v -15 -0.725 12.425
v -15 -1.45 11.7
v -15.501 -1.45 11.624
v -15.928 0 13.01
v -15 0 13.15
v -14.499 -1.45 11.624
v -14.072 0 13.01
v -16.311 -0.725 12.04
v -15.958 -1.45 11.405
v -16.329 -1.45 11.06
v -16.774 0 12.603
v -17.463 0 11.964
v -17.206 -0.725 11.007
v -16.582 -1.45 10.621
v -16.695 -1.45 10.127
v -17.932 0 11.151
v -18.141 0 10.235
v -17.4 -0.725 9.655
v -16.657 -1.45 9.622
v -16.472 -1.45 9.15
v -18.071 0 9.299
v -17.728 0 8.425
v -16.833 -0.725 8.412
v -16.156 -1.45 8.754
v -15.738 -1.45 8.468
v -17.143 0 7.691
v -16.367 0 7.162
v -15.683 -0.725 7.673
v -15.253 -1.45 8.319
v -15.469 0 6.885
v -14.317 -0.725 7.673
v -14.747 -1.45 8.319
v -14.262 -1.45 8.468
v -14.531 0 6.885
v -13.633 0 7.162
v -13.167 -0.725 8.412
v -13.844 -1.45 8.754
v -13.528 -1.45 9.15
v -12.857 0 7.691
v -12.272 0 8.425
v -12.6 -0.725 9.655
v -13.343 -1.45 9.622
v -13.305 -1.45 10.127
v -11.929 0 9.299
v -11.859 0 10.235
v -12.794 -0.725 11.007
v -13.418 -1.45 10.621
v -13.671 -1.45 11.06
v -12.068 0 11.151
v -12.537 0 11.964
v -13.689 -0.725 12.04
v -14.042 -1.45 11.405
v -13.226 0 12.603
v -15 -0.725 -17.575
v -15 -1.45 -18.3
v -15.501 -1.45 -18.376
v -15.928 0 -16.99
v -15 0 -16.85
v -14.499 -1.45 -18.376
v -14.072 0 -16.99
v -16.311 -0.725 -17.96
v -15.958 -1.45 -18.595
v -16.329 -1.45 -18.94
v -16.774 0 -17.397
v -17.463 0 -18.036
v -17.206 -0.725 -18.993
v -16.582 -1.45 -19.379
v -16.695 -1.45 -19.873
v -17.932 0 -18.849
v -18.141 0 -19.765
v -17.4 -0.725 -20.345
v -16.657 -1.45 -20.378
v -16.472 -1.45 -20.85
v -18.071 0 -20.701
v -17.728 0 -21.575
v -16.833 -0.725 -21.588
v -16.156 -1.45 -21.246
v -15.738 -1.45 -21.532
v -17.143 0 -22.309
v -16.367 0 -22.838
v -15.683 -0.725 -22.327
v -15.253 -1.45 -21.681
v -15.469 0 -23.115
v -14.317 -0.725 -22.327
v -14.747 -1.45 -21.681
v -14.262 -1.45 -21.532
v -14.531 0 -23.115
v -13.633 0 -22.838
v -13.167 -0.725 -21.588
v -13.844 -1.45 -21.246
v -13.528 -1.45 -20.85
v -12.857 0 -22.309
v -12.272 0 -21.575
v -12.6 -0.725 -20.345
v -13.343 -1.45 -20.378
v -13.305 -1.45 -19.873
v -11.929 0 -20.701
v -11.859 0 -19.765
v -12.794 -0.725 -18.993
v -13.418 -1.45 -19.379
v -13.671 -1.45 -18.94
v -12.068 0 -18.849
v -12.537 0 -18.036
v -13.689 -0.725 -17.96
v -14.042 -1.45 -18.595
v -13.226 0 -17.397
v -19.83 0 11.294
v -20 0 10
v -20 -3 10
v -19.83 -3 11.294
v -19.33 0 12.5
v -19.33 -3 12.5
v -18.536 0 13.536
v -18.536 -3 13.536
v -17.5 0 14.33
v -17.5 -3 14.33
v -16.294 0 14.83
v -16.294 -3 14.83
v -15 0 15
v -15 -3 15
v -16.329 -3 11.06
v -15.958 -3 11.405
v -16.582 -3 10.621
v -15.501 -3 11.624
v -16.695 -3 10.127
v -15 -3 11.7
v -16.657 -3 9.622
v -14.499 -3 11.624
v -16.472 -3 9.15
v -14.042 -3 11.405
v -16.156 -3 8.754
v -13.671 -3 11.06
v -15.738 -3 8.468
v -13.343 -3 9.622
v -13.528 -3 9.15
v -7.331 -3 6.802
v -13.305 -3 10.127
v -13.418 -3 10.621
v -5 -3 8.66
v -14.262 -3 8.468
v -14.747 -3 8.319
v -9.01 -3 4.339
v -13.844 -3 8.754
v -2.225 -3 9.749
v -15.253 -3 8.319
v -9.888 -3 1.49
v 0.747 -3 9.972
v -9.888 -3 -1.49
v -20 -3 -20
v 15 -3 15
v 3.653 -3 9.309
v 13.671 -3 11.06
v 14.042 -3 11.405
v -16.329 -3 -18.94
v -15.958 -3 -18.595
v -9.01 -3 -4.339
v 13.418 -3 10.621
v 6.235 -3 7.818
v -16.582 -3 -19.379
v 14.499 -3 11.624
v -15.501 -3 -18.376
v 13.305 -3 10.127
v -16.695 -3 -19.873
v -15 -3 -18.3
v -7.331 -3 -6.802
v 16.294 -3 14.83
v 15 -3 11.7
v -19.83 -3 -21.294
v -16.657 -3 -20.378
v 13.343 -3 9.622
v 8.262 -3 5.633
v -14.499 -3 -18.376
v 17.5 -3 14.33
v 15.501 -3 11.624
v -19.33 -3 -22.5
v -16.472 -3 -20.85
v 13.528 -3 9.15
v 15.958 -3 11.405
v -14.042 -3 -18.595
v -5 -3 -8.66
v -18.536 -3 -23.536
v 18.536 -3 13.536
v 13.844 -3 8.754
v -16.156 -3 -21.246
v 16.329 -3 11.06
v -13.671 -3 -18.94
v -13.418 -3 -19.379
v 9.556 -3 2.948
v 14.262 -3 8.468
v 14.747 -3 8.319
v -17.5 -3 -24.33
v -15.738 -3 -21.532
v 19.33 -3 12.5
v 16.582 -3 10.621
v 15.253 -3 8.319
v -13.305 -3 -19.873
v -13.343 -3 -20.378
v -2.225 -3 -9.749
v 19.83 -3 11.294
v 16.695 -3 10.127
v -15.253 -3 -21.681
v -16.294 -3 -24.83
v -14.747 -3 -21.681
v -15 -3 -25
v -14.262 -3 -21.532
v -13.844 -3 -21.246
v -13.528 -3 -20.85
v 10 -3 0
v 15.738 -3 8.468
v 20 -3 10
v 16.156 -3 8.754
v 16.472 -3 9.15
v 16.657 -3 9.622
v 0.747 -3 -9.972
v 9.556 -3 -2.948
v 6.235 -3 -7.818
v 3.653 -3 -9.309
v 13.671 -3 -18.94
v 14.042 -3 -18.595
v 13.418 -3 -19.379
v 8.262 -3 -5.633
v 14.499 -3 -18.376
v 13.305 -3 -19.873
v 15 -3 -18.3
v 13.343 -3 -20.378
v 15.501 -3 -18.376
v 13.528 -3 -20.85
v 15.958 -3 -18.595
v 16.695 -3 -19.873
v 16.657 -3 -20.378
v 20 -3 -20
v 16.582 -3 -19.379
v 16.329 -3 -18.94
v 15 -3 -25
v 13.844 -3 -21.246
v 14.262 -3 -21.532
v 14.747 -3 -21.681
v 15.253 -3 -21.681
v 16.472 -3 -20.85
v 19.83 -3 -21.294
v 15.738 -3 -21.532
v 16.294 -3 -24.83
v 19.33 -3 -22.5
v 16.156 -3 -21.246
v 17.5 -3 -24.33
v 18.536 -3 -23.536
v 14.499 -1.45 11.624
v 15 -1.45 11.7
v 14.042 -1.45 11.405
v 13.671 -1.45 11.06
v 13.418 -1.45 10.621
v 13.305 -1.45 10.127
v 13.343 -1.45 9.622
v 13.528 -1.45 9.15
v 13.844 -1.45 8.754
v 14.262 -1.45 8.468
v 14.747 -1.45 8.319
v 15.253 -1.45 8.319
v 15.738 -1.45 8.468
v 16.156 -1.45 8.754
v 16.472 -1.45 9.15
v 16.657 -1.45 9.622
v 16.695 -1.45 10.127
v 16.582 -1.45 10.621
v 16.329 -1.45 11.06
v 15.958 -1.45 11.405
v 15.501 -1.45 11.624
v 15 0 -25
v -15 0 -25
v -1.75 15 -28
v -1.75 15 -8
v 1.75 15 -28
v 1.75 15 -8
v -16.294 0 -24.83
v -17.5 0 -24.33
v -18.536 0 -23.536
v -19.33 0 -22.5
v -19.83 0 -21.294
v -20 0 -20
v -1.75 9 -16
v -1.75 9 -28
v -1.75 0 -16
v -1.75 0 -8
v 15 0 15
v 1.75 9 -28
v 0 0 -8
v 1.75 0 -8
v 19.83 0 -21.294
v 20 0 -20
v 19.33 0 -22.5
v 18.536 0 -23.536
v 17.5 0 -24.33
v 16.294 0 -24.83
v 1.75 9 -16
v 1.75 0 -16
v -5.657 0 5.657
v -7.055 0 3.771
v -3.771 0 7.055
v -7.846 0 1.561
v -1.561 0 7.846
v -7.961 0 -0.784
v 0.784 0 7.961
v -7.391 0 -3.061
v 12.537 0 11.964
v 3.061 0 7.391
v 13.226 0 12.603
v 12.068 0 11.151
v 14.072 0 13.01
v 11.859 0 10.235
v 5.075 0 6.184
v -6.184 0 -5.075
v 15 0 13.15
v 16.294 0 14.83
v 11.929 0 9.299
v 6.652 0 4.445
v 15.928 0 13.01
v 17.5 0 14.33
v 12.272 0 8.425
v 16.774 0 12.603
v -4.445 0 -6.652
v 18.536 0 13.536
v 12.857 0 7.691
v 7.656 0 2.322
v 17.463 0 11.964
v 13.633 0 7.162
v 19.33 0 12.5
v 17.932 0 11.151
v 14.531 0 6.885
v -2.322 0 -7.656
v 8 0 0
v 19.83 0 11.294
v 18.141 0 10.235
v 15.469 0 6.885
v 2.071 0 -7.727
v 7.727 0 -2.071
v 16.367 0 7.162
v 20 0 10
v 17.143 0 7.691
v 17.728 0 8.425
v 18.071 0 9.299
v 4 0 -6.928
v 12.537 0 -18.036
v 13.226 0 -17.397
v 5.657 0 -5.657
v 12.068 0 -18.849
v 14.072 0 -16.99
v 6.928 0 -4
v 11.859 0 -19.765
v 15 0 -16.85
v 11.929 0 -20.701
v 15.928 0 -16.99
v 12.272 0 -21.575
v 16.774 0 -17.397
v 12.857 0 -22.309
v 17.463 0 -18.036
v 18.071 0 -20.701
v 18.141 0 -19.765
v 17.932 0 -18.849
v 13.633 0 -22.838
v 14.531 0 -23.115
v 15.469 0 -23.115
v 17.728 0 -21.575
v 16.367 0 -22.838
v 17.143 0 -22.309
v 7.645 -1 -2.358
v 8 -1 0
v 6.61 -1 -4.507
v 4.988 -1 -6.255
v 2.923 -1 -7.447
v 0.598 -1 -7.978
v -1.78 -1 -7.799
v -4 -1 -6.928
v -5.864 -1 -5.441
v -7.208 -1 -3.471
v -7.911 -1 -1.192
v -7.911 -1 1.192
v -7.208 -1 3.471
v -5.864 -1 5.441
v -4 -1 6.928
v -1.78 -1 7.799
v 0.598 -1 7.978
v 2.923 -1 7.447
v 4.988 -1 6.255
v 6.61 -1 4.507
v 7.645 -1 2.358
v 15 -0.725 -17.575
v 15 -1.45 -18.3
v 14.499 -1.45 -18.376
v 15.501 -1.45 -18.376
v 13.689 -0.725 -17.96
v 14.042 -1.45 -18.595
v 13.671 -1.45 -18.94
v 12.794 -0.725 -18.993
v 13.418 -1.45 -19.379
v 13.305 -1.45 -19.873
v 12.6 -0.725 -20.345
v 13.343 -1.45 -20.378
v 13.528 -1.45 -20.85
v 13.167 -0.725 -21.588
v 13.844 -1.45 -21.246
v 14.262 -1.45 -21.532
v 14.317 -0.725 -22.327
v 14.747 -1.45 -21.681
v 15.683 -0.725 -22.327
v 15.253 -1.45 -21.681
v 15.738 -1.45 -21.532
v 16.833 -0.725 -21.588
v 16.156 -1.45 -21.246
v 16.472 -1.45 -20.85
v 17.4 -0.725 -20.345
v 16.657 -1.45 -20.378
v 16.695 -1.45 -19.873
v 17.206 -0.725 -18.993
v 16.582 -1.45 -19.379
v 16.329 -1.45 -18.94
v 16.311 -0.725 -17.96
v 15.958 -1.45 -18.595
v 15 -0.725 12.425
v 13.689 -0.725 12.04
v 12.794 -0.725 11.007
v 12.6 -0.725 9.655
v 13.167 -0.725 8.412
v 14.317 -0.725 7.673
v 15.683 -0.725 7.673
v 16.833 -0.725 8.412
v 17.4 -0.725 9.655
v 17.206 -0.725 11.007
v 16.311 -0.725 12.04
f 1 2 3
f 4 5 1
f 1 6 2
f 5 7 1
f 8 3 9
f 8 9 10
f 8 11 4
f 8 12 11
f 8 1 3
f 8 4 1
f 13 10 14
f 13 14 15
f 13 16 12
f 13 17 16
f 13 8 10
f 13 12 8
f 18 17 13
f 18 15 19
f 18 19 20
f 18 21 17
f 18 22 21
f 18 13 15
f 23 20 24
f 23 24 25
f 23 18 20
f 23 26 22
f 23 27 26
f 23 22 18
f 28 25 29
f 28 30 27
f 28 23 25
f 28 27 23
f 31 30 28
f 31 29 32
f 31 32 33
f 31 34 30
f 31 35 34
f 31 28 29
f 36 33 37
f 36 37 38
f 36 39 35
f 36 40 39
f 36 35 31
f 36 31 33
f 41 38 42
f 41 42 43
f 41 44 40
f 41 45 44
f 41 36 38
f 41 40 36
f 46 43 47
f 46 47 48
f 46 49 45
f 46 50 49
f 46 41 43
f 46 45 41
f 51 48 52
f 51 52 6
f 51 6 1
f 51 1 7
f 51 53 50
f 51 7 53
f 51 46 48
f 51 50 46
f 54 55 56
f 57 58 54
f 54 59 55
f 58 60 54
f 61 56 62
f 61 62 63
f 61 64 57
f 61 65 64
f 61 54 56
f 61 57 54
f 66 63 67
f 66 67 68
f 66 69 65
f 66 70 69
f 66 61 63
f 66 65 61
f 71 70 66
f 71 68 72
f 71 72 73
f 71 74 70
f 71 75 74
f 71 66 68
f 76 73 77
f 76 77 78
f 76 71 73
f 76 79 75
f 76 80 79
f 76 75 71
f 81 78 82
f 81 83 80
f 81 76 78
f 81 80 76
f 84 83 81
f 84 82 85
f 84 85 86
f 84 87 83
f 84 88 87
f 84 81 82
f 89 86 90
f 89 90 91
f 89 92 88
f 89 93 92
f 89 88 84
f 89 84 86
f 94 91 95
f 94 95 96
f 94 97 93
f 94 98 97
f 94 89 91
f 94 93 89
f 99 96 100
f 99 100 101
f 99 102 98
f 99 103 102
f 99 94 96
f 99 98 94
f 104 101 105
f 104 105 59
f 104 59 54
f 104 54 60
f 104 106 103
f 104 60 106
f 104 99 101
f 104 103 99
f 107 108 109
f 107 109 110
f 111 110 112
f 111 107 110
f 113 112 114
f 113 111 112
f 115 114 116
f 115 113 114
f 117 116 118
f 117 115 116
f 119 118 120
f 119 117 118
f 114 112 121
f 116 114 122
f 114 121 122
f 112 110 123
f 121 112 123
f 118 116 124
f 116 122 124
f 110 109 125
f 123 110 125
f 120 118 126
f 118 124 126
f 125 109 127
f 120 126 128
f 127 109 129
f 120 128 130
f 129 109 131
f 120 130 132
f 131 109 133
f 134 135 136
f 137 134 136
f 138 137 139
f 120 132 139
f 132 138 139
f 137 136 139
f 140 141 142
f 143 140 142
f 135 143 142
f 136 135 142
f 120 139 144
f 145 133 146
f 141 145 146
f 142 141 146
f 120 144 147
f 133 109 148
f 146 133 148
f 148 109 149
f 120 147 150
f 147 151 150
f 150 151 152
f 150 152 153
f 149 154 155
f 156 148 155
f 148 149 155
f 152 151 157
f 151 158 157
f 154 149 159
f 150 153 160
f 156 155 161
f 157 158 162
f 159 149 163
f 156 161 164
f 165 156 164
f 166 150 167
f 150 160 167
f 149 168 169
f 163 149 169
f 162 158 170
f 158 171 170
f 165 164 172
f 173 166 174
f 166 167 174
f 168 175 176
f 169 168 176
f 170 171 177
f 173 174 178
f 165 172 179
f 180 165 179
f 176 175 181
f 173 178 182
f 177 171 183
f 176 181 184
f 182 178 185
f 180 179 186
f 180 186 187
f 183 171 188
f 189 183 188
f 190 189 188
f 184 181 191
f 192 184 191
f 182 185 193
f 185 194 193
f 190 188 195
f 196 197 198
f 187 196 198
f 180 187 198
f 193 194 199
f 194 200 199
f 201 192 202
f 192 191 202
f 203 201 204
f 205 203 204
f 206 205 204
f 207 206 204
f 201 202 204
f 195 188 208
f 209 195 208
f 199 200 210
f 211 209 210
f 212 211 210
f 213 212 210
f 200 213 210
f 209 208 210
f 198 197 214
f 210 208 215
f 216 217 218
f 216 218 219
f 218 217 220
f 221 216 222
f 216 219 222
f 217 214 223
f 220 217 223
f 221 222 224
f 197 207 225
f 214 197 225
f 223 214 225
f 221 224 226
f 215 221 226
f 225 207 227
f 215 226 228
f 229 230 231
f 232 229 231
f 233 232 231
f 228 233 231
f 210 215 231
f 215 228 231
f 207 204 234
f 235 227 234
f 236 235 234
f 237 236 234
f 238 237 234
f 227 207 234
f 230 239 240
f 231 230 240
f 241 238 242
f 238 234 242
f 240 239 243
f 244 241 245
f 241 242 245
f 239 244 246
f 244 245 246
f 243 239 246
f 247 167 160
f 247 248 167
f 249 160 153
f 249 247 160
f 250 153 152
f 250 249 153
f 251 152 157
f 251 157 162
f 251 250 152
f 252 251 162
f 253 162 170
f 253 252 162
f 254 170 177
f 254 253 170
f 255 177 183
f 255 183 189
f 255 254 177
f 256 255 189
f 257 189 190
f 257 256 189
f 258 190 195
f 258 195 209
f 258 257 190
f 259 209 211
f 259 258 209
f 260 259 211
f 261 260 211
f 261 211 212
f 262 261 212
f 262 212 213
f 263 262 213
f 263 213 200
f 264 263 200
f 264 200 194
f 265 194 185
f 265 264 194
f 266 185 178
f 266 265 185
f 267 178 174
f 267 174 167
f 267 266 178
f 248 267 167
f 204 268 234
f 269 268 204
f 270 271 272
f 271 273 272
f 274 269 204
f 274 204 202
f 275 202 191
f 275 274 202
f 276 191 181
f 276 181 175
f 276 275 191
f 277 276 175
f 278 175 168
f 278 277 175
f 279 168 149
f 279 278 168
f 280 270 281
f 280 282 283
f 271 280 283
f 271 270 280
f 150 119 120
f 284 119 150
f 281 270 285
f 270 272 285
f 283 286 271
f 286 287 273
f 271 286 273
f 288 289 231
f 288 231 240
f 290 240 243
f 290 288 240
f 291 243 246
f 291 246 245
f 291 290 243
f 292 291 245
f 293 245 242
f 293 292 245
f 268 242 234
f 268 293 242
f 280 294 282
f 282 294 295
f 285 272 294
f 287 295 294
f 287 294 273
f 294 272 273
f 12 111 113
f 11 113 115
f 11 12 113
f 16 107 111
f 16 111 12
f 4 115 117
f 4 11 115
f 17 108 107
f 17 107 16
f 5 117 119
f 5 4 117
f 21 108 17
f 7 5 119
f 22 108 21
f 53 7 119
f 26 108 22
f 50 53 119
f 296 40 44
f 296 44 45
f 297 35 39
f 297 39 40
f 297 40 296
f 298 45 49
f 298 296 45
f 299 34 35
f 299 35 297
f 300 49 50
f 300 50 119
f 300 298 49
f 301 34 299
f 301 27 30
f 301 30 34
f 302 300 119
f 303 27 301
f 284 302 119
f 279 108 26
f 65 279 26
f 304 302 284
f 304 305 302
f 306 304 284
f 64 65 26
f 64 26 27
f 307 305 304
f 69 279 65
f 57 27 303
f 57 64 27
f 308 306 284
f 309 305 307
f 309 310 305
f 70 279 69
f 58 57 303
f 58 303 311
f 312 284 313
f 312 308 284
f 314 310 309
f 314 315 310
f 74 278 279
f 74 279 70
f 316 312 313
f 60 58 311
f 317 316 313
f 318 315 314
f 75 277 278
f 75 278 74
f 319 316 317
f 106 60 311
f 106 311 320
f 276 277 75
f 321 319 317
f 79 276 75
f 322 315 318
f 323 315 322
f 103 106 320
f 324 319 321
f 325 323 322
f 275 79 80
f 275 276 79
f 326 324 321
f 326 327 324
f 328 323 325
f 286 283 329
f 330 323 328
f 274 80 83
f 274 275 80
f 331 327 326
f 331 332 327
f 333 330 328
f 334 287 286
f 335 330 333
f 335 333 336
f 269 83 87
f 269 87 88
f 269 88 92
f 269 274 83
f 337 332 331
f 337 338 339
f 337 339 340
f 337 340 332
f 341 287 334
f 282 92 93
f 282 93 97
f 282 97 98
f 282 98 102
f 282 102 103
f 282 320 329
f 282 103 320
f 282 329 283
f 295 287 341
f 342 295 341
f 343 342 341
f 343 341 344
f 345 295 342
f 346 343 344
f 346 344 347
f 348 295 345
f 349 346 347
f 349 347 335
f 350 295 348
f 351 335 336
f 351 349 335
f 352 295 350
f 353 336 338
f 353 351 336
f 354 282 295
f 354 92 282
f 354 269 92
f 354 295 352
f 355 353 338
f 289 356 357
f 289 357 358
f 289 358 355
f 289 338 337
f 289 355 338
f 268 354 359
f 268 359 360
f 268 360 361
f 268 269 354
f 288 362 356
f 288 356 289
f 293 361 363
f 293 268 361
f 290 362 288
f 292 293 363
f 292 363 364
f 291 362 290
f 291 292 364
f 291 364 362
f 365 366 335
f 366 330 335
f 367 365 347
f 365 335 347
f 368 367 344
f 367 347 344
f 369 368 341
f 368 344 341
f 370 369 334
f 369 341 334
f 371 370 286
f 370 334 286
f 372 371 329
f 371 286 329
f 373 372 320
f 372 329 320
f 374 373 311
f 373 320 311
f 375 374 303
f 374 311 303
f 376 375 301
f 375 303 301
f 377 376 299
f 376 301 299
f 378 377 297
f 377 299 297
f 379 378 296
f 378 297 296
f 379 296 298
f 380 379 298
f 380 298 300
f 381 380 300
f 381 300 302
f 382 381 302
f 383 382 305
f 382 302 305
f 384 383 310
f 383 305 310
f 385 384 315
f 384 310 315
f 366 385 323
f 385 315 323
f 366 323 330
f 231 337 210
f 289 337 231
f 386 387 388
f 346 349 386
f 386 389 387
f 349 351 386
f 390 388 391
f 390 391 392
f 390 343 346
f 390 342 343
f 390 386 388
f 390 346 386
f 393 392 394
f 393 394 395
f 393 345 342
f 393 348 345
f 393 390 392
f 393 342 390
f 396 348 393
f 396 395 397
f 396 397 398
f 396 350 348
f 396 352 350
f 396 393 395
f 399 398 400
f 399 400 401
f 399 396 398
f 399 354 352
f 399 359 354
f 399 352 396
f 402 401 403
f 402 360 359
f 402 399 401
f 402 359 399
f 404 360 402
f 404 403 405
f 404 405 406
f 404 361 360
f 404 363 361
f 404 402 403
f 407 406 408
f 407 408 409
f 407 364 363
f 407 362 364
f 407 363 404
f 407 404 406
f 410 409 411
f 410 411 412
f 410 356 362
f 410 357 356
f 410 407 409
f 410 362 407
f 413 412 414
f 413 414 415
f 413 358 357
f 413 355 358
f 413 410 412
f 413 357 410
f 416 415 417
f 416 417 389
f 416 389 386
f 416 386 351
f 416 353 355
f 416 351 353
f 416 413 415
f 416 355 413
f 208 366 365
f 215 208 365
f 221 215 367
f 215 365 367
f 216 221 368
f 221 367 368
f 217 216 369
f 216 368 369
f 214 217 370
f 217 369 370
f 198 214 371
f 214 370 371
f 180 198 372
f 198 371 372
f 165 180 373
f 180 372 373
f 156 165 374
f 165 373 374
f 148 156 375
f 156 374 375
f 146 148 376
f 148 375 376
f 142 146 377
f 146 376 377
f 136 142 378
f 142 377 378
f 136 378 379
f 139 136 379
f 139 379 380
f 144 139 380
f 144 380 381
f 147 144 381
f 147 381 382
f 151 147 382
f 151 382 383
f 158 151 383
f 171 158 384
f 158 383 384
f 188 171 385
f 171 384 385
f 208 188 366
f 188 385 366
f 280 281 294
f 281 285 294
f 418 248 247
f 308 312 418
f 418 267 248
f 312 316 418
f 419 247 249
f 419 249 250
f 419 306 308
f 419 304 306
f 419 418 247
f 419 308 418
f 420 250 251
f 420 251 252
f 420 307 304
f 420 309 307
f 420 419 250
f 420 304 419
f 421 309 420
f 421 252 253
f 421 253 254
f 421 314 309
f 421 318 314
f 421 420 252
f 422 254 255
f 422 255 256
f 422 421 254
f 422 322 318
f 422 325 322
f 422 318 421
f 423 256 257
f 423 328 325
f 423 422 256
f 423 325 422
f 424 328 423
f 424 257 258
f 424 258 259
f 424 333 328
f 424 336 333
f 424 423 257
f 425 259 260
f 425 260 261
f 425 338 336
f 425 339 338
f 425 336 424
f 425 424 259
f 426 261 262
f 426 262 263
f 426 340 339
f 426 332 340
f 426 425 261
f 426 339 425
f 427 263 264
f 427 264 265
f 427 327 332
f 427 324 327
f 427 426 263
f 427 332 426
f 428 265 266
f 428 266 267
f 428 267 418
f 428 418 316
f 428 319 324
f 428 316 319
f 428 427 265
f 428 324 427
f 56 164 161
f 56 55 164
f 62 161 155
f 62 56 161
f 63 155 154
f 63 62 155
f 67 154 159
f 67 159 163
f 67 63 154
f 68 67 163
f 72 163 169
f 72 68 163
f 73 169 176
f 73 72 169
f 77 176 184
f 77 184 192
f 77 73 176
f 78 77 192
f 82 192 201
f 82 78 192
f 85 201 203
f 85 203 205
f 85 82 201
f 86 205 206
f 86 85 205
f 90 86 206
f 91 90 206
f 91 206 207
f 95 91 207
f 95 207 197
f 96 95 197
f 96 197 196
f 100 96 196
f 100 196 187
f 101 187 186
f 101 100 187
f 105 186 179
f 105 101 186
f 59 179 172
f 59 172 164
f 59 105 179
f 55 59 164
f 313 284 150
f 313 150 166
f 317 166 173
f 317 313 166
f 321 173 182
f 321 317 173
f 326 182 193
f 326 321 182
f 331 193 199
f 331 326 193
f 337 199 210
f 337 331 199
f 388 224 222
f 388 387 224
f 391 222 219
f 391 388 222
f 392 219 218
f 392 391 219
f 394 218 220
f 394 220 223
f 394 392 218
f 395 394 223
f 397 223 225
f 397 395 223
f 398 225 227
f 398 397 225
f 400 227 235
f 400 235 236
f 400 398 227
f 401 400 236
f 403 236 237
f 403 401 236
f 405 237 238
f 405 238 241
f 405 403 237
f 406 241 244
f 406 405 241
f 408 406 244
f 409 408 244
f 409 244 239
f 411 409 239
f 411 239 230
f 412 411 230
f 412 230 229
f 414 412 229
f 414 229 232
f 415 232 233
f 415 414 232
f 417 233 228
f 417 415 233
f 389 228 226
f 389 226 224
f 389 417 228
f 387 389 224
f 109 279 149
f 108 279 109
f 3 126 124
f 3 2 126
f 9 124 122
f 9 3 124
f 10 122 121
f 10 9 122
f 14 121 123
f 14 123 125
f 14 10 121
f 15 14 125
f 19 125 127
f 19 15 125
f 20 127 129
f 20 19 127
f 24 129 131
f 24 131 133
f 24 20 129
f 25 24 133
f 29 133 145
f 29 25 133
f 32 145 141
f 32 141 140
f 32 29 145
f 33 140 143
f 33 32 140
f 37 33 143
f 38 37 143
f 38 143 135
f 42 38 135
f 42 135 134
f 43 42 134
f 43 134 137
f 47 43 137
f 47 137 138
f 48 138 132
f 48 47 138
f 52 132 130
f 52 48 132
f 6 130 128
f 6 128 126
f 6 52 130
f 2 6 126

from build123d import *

# Parameters (mm, degrees)
SKETCH1_R                                    = 8
BOSS_EXTRUDE1_DEPTH                          = 3
CSK_FOR_M3_COUNTERSUNK_FLAT_HEAD_SCR_2_COUNT = 2
CSK_FOR_M3_COUNTERSUNK_FLAT_HEAD_SCR_2_PITCH = 30
CSK_FOR_M3_COUNTERSUNK_FLAT_HEAD_SCR_3_COUNT = 2
CSK_FOR_M3_COUNTERSUNK_FLAT_HEAD_SCR_3_PITCH = 42.426406871
CSK_FOR_M3_COUNTERSUNK_FLAT_HEAD_SCR_4_COUNT = 2
CSK_FOR_M3_COUNTERSUNK_FLAT_HEAD_SCR_4_PITCH = 30
CHAMFER1_SIZE                                = 2
BOSS_EXTRUDE2_DEPTH                          = 1.75


with BuildPart() as part:
    # Sketch1 → Boss-Extrude1 (new body)
    with BuildSketch(Plane(origin=(0, 0, 0), x_dir=(1, 0, 0), z_dir=(0, 1, 0))):
        with BuildLine():
            Line((-15, -15), (15, -15))
            ThreePointArc((15, -15), (18.535533906, -13.535533906), (20, -10))
            Line((20, -10), (20, 20))
            ThreePointArc((20, 20), (18.535533906, 23.535533906), (15, 25))
            Line((15, 25), (-15, 25))
            ThreePointArc((-15, 25), (-18.535533906, 23.535533906), (-20, 20))
            Line((-20, 20), (-20, -10))
            ThreePointArc((-20, -10), (-18.535533906, -13.535533906), (-15, -15))
        make_face()
        Circle(SKETCH1_R, mode=Mode.SUBTRACT)
    extrude(amount=-BOSS_EXTRUDE1_DEPTH)

    # Sketch6 → CSK for M3 Countersunk Flat Head Screw1 (revolve, cut)
    with BuildSketch(Plane(origin=(-15, 0, -20), x_dir=(0, 0, 1), z_dir=(1, 0, 0))):
        Polygon((0, 0), (0, 3), (1.7, 3), (1.7, 1.45), (3.15, 0), align=None)
    csk_for_m3_countersunk_flat_head_screw1 = revolve(axis=Axis((-15, 6.35, -20), (0, -1, 0)), mode=Mode.SUBTRACT)

    # CSK for M3 Countersunk Flat Head Scr 2: CSK for M3 Countersunk Flat Head Screw1 ×2
    with Locations(*[(i * CSK_FOR_M3_COUNTERSUNK_FLAT_HEAD_SCR_2_PITCH, 0, 0) for i in range(1, CSK_FOR_M3_COUNTERSUNK_FLAT_HEAD_SCR_2_COUNT)]):
        add(csk_for_m3_countersunk_flat_head_screw1, mode=Mode.SUBTRACT)

    # CSK for M3 Countersunk Flat Head Scr 3: CSK for M3 Countersunk Flat Head Screw1 ×2
    with Locations(*[Vector(0.707106781, 0, 0.707106781) * (i * CSK_FOR_M3_COUNTERSUNK_FLAT_HEAD_SCR_3_PITCH) for i in range(1, CSK_FOR_M3_COUNTERSUNK_FLAT_HEAD_SCR_3_COUNT)]):
        add(csk_for_m3_countersunk_flat_head_screw1, mode=Mode.SUBTRACT)

    # CSK for M3 Countersunk Flat Head Scr 4: CSK for M3 Countersunk Flat Head Screw1 ×2
    with Locations(*[(0, 0, i * CSK_FOR_M3_COUNTERSUNK_FLAT_HEAD_SCR_4_PITCH) for i in range(1, CSK_FOR_M3_COUNTERSUNK_FLAT_HEAD_SCR_4_COUNT)]):
        add(csk_for_m3_countersunk_flat_head_screw1, mode=Mode.SUBTRACT)

    # Chamfer1
    chamfer1_edges = [part.edges().sort_by_distance(p)[0] for p in [
        (-8, -3, 0),
    ]]
    chamfer(chamfer1_edges, length=CHAMFER1_SIZE)

    # Sketch9 → Boss-Extrude2 (add, symmetric)
    with BuildSketch(Plane(origin=(0, 0, 0), x_dir=(0, 0, -1), z_dir=(1, 0, 0))):
        Polygon((8, 0), (8, 15), (28, 15), (28, 9), (16, 9), (16, 0), align=None)
    extrude(amount=BOSS_EXTRUDE2_DEPTH, both=True)


solid = part.part
